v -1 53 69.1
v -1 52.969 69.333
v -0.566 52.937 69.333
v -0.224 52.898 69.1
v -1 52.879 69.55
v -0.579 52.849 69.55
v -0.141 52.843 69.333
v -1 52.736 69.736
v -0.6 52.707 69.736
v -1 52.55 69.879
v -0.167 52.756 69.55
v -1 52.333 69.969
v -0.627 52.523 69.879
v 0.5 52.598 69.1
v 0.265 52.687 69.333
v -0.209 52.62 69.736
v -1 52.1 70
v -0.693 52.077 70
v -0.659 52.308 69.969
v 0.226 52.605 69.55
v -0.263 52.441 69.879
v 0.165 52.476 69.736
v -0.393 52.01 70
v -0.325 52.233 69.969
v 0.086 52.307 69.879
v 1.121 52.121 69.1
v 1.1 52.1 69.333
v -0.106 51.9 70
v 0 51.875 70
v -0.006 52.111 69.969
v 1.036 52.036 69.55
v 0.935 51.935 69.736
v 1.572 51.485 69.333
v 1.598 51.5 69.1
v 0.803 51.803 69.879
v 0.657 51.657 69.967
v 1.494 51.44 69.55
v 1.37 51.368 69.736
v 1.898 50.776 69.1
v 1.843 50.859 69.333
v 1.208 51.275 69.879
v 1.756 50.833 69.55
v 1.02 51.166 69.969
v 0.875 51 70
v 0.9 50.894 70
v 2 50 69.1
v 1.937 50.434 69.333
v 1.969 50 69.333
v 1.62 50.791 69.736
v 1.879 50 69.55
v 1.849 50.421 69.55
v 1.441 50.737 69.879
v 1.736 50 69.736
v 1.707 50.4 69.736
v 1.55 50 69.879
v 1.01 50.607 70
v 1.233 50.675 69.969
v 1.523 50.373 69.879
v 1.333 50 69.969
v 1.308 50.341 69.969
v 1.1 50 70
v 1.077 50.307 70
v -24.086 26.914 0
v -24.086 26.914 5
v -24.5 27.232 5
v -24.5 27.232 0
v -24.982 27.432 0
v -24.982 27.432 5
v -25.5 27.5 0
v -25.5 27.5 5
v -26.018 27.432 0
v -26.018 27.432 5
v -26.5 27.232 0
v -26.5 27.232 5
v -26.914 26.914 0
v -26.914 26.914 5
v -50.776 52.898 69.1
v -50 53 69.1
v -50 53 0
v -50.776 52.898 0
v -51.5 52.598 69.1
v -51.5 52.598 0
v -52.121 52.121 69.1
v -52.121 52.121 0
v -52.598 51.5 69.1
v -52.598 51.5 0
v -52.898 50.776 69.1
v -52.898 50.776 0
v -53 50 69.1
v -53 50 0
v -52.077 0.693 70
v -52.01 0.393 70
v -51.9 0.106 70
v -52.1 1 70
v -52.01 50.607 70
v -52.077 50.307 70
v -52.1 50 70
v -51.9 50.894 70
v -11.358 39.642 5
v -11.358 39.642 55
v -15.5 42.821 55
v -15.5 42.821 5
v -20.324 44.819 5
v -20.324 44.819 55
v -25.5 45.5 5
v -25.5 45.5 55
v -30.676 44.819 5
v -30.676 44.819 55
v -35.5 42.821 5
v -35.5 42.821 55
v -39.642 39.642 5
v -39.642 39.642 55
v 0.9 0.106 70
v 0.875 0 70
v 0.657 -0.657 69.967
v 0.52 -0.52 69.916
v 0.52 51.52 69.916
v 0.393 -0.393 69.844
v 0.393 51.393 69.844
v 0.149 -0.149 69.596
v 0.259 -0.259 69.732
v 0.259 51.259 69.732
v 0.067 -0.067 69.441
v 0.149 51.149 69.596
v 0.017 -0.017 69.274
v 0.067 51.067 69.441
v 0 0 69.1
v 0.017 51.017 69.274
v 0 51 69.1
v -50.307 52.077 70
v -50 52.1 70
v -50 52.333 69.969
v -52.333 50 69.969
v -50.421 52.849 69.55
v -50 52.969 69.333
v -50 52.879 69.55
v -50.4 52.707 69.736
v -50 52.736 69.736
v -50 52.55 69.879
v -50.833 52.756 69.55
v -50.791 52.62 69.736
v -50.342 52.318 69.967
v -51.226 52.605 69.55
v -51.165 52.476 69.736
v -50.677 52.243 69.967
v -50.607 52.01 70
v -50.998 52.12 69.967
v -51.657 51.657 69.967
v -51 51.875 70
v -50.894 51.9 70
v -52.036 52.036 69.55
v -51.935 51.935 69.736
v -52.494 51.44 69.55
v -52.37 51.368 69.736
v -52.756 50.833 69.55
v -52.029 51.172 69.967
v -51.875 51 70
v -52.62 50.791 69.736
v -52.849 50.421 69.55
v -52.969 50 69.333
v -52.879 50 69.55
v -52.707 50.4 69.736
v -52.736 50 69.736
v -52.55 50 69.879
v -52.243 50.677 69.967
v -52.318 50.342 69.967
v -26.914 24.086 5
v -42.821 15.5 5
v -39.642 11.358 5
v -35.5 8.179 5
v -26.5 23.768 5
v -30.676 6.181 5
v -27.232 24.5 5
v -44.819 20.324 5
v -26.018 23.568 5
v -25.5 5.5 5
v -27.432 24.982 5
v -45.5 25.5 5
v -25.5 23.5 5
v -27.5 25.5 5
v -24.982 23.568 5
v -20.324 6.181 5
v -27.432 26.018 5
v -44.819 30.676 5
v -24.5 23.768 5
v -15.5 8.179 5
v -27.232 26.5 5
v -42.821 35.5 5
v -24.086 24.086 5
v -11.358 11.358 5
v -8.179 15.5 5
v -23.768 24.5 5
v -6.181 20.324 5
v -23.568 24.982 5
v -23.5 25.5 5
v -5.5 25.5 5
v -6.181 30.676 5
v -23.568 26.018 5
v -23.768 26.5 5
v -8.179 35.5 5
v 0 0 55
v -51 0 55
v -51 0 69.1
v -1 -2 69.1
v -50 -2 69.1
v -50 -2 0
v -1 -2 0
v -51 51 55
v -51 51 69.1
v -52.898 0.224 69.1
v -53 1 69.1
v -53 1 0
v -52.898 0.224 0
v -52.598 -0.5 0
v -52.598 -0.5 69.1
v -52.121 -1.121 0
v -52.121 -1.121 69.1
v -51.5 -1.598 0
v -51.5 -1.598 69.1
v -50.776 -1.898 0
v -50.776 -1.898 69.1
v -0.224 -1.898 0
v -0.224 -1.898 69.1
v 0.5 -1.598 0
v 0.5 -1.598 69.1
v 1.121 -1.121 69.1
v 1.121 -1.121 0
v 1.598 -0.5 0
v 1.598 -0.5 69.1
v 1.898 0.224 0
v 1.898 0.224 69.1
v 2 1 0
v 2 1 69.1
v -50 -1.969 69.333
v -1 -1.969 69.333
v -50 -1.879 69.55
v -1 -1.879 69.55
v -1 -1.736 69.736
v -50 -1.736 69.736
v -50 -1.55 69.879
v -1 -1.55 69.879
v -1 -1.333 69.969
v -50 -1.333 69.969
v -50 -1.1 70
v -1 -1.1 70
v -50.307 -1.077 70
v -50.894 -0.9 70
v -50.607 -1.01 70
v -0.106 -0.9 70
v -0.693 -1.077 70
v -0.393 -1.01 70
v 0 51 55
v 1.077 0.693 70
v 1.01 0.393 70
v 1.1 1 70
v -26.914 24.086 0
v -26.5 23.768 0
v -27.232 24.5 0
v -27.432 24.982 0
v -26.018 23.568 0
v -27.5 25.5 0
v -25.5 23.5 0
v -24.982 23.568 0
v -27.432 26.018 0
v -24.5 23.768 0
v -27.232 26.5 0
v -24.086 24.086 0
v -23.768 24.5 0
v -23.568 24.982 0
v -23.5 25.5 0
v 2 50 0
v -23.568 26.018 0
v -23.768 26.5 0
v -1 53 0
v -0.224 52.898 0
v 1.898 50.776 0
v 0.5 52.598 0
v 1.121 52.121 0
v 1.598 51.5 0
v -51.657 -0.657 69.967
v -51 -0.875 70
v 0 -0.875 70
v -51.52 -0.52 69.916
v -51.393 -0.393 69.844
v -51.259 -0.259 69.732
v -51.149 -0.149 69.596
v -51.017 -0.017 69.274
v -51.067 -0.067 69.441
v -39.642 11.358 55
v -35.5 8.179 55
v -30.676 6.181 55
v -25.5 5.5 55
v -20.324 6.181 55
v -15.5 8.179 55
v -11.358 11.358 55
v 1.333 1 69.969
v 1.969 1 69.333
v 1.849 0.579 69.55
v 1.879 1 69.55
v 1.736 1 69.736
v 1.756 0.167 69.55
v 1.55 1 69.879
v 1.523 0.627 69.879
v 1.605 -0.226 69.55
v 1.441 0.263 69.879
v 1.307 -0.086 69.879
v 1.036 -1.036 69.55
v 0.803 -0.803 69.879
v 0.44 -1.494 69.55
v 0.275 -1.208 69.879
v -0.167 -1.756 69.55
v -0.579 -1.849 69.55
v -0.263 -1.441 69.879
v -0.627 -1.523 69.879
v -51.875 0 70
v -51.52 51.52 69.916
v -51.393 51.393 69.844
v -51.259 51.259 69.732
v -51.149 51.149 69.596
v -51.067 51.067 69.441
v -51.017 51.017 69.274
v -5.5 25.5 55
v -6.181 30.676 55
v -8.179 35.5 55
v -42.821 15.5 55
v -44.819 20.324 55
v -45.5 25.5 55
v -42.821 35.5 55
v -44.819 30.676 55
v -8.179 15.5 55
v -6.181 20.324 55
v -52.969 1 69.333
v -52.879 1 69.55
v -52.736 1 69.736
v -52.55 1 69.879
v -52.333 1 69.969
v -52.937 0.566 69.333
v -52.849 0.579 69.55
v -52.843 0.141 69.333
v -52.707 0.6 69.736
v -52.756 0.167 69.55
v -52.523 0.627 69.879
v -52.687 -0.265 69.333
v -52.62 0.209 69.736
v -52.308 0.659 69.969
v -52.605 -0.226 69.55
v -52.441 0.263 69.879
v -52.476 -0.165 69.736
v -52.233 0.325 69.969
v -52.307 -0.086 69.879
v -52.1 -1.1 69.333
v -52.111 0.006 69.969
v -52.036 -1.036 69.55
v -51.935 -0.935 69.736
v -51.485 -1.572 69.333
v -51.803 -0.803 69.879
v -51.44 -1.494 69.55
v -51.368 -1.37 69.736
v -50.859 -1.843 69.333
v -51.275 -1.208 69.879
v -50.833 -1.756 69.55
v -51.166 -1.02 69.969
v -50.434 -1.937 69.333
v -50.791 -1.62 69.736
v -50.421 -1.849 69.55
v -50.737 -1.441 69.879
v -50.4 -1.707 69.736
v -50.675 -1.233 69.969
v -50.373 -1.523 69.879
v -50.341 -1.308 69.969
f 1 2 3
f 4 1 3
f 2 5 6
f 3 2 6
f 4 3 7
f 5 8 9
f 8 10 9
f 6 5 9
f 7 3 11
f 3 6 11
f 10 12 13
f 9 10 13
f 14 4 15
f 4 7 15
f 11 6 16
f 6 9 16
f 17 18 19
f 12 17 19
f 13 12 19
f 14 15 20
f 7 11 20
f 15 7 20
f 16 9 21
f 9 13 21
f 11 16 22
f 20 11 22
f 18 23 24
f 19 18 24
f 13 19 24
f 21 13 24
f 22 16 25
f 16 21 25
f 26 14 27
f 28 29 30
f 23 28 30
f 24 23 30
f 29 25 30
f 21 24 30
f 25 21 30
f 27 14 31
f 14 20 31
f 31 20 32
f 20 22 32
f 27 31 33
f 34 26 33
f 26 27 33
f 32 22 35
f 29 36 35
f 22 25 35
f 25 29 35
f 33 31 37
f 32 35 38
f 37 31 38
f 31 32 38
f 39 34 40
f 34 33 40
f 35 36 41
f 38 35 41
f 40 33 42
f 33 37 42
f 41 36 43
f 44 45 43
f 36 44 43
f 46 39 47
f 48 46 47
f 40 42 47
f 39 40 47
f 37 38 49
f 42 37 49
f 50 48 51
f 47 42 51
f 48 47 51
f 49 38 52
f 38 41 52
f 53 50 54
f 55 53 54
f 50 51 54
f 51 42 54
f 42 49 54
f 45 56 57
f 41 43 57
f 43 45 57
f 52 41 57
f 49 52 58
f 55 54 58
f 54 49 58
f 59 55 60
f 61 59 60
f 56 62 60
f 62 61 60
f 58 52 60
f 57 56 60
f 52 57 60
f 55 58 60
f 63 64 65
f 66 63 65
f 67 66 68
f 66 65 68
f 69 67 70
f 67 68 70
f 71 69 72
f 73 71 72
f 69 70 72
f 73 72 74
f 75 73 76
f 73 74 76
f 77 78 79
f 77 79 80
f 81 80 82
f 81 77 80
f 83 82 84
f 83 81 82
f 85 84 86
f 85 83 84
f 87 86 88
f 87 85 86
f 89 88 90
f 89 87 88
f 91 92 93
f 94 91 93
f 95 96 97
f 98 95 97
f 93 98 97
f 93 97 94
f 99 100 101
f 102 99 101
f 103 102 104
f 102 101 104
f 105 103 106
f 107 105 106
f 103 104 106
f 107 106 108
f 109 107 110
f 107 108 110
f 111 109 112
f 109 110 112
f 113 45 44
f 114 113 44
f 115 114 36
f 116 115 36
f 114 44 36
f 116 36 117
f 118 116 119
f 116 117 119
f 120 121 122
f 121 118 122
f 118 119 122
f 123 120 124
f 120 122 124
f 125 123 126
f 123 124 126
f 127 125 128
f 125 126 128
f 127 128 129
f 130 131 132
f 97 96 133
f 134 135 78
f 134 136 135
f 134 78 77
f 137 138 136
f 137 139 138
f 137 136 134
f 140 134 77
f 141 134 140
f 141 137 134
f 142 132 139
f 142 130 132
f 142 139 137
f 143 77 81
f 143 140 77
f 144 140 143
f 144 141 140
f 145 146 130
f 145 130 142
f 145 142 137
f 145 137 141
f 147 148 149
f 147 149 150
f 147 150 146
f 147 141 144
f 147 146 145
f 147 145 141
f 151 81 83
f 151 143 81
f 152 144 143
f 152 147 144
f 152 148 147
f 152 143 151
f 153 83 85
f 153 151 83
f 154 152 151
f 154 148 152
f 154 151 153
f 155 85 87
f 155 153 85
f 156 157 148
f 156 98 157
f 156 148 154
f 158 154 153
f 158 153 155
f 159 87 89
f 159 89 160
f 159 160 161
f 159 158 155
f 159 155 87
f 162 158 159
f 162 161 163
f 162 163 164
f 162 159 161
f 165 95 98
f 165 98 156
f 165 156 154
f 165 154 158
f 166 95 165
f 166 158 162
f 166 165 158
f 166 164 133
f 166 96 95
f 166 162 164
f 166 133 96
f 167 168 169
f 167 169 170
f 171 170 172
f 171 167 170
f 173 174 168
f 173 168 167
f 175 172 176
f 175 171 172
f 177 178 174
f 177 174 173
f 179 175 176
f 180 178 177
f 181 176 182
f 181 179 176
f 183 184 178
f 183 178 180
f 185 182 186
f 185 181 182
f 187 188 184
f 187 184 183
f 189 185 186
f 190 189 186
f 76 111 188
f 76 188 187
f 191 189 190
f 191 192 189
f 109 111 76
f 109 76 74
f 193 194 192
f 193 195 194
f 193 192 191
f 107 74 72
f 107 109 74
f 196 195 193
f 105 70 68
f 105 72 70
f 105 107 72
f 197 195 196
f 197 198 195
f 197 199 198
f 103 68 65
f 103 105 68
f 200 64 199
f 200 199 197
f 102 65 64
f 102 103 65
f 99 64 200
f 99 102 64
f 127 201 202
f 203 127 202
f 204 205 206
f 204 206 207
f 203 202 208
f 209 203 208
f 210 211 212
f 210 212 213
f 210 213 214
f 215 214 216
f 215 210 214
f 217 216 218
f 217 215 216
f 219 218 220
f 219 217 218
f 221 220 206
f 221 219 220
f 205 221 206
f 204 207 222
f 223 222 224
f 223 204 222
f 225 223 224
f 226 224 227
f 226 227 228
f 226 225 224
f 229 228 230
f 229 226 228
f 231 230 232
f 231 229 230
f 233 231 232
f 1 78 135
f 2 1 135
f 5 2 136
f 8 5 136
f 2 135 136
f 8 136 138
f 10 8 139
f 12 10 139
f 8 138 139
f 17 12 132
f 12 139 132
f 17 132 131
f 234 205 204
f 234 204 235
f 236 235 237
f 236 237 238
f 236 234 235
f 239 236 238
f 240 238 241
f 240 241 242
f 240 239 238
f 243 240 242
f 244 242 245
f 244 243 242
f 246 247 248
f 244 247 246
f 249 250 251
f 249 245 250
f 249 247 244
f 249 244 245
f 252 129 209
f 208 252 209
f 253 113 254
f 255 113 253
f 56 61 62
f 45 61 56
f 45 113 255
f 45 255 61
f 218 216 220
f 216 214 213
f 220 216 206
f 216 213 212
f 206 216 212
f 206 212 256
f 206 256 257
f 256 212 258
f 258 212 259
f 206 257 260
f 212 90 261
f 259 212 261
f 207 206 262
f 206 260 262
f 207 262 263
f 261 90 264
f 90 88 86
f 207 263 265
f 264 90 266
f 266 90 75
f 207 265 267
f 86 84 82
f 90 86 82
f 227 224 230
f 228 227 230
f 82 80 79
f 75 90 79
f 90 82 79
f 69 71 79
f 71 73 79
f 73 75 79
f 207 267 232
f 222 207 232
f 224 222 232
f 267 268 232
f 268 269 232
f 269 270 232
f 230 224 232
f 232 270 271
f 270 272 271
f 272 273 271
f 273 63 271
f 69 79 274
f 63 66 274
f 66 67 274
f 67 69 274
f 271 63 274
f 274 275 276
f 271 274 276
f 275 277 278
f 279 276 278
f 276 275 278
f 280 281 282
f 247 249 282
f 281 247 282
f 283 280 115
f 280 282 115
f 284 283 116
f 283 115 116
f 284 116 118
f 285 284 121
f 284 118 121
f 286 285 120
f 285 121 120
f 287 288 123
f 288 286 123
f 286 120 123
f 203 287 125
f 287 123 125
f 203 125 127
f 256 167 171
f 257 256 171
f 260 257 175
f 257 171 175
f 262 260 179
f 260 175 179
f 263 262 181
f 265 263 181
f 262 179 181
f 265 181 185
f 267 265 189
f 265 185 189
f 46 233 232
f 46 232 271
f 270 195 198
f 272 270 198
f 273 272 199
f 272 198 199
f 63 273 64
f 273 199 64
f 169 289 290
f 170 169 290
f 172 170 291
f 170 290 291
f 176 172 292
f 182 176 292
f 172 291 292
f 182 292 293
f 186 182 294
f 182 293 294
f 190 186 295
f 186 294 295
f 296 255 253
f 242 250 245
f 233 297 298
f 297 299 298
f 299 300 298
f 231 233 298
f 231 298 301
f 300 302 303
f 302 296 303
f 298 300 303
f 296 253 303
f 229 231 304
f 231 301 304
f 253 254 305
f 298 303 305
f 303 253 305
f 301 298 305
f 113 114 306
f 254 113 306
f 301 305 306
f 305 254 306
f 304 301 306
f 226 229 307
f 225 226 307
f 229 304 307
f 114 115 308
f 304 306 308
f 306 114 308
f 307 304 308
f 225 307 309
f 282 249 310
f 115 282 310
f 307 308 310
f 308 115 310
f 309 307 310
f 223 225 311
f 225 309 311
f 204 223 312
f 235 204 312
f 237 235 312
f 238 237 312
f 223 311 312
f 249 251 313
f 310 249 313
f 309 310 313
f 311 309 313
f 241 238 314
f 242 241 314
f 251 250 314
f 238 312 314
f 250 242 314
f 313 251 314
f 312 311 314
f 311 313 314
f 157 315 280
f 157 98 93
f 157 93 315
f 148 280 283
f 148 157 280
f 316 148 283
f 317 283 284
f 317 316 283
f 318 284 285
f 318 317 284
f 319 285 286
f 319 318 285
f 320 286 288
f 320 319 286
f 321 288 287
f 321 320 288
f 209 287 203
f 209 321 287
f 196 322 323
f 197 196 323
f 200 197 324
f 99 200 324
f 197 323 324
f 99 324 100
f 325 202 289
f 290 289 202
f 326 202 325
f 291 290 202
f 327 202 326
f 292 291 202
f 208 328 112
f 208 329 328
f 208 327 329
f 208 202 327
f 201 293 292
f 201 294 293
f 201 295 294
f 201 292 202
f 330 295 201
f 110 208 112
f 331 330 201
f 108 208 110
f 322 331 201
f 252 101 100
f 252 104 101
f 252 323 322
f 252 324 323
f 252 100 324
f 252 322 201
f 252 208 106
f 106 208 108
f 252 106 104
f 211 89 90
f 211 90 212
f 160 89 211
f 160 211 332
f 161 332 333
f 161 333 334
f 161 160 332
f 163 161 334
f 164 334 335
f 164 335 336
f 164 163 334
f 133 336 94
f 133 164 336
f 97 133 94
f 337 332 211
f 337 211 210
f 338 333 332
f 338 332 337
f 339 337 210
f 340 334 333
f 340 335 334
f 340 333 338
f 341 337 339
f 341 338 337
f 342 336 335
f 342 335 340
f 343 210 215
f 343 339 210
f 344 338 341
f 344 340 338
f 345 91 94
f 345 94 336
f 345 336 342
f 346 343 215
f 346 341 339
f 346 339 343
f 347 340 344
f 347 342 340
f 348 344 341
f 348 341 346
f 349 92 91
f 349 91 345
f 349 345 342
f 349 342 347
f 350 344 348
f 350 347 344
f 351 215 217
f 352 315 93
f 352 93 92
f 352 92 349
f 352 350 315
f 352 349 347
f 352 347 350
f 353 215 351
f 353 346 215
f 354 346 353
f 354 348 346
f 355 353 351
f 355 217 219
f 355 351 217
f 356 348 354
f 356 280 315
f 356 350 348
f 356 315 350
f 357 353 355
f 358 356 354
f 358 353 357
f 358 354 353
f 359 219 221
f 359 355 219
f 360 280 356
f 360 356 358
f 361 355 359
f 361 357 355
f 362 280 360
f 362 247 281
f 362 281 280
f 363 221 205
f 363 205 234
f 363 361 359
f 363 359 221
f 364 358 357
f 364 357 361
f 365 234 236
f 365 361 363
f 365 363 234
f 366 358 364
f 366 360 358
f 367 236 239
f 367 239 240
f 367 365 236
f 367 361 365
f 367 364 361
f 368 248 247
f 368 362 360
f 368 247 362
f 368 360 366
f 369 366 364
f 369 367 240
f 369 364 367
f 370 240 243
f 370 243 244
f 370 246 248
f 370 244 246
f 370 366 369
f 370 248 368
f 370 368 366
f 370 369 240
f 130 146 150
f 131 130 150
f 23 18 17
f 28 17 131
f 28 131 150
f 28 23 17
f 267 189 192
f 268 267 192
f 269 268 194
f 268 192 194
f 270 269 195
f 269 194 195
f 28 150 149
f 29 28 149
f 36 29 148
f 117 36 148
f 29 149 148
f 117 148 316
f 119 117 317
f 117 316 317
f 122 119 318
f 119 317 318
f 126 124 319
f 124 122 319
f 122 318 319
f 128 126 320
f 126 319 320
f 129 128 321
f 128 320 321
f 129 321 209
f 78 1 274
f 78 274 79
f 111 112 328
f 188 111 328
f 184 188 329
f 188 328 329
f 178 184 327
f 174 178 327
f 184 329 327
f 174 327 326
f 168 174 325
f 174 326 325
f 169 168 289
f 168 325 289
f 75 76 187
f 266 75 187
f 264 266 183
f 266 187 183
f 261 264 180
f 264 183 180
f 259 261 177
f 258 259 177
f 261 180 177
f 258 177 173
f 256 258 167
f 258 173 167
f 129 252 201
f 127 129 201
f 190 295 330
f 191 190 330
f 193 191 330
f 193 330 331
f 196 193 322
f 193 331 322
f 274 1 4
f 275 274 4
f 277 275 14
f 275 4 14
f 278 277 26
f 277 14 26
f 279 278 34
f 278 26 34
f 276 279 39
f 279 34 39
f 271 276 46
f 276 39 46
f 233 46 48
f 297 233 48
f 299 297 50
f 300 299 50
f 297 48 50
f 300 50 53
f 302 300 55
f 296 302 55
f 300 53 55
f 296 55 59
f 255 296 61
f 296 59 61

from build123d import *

# Parameters (mm, degrees)
F0_W         = 51
F0_H         = 51
F1_DEPTH     = 55
F2_DEPTH     = 70
F4_DEPTH     = 50
F5_DEPTH     = 100
F6_R         = 3
F7_T1_DEPTH  = 51
F7_T3_DEPTH  = 51
F7_T5_DEPTH  = 49
F7_T7_DEPTH  = 49
F7_T10_ANGLE = 90
F7_T12_ANGLE = 90
F7_T14_ANGLE = 90
F7_T16_ANGLE = 90
F7_T21_DEPTH = 53.25
F7_T25_DEPTH = 53.25
F7_T32_DEPTH = 53.25
F7_T36_DEPTH = 53.25
F7_T43_DEPTH = 53.25
F7_T47_DEPTH = 53.25
F7_T54_DEPTH = 53.25
F7_T58_DEPTH = 53.25


# Not quite as in the source:
# - a fillet or chamfer that OpenCascade refuses, or shapes differently, is made with other operations: its cross-section is extruded or revolved along the edge and cut away or added


with BuildPart() as f1:
    # F0 (on Top) → F1 (new body)
    with BuildSketch(Plane.XY):
        with Locations((-25.5, 25.5)):
            Rectangle(F0_W, F0_H)
    extrude(amount=F1_DEPTH)

    # F0 (on Top) → F2 (join)
    with BuildSketch(Plane.XY):
        Polygon((-51, -2), (-51, 0), (-51, 51), (0, 51), (2, 51), (2, 53), (-53, 53), (-53, -2), align=None)
        Polygon((0, 51), (0, 0), (-51, 0), (-51, -2), (0, -2), (2, -2), (2, 51), align=None)
    extrude(amount=F2_DEPTH)

    # F3 (on face) → F4 (cut)
    with BuildSketch(Plane.XY.offset(55)):
        with BuildLine():
            Line((-26.9142135624, 26.9142135624), (-39.6421356237, 39.6421356237))
            ThreePointArc((-39.6421356237, 39.6421356237), (-45.5, 25.5), (-39.6421356237, 11.3578643763))
            Line((-39.6421356237, 11.3578643763), (-26.9142135624, 24.0857864376))
            ThreePointArc((-26.9142135624, 24.0857864376), (-27.5, 25.5), (-26.9142135624, 26.9142135624))
        make_face()
        with BuildLine():
            Line((-24.0857864376, 26.9142135624), (-25.5, 25.5))
            Line((-25.5, 25.5), (-24.0857864376, 24.0857864376))
            ThreePointArc((-24.0857864376, 24.0857864376), (-23.652240935, 24.7346331353), (-23.5, 25.5))
            ThreePointArc((-23.5, 25.5), (-23.652240935, 26.2653668647), (-24.0857864376, 26.9142135624))
        make_face()
        with BuildLine():
            Line((-24.0857864376, 24.0857864376), (-25.5, 25.5))
            Line((-25.5, 25.5), (-26.9142135624, 24.0857864376))
            ThreePointArc((-26.9142135624, 24.0857864376), (-25.5, 23.5), (-24.0857864376, 24.0857864376))
        make_face()
        with BuildLine():
            ThreePointArc((-11.3578643763, 39.6421356237), (-25.5, 45.5), (-39.6421356237, 39.6421356237))
            Line((-39.6421356237, 39.6421356237), (-26.9142135624, 26.9142135624))
            ThreePointArc((-26.9142135624, 26.9142135624), (-25.5, 27.5), (-24.0857864376, 26.9142135624))
            Line((-24.0857864376, 26.9142135624), (-11.3578643763, 39.6421356237))
        make_face()
        with BuildLine():
            Line((-25.5, 25.5), (-26.9142135624, 26.9142135624))
            ThreePointArc((-26.9142135624, 26.9142135624), (-27.5, 25.5), (-26.9142135624, 24.0857864376))
            Line((-26.9142135624, 24.0857864376), (-25.5, 25.5))
        make_face()
        with BuildLine():
            ThreePointArc((-5.5, 25.5), (-7.0224093498, 33.1536686473), (-11.3578643763, 39.6421356237))
            Line((-11.3578643763, 39.6421356237), (-24.0857864376, 26.9142135624))
            ThreePointArc((-24.0857864376, 26.9142135624), (-23.652240935, 26.2653668647), (-23.5, 25.5))
            ThreePointArc((-23.5, 25.5), (-23.652240935, 24.7346331353), (-24.0857864376, 24.0857864376))
            Line((-24.0857864376, 24.0857864376), (-11.3578643763, 11.3578643763))
            ThreePointArc((-11.3578643763, 11.3578643763), (-7.0224093498, 17.8463313527), (-5.5, 25.5))
        make_face()
        with BuildLine():
            Line((-26.9142135624, 24.0857864376), (-39.6421356237, 11.3578643763))
            ThreePointArc((-39.6421356237, 11.3578643763), (-25.5, 5.5), (-11.3578643763, 11.3578643763))
            Line((-11.3578643763, 11.3578643763), (-24.0857864376, 24.0857864376))
            ThreePointArc((-24.0857864376, 24.0857864376), (-25.5, 23.5), (-26.9142135624, 24.0857864376))
        make_face()
        with BuildLine():
            ThreePointArc((-24.0857864376, 26.9142135624), (-25.5, 27.5), (-26.9142135624, 26.9142135624))
            Line((-26.9142135624, 26.9142135624), (-25.5, 25.5))
            Line((-25.5, 25.5), (-24.0857864376, 26.9142135624))
        make_face()
    extrude(amount=-F4_DEPTH, mode=Mode.SUBTRACT)

    # F3 (on face) → F5 (cut)
    with BuildSketch(Plane.XY.offset(55)):
        with BuildLine():
            ThreePointArc((-24.0857864376, 26.9142135624), (-25.5, 27.5), (-26.9142135624, 26.9142135624))
            Line((-26.9142135624, 26.9142135624), (-25.5, 25.5))
            Line((-25.5, 25.5), (-24.0857864376, 26.9142135624))
        make_face()
        with BuildLine():
            Line((-24.0857864376, 26.9142135624), (-25.5, 25.5))
            Line((-25.5, 25.5), (-24.0857864376, 24.0857864376))
            ThreePointArc((-24.0857864376, 24.0857864376), (-23.652240935, 24.7346331353), (-23.5, 25.5))
            ThreePointArc((-23.5, 25.5), (-23.652240935, 26.2653668647), (-24.0857864376, 26.9142135624))
        make_face()
        with BuildLine():
            Line((-24.0857864376, 24.0857864376), (-25.5, 25.5))
            Line((-25.5, 25.5), (-26.9142135624, 24.0857864376))
            ThreePointArc((-26.9142135624, 24.0857864376), (-25.5, 23.5), (-24.0857864376, 24.0857864376))
        make_face()
        with BuildLine():
            Line((-25.5, 25.5), (-26.9142135624, 26.9142135624))
            ThreePointArc((-26.9142135624, 26.9142135624), (-27.5, 25.5), (-26.9142135624, 24.0857864376))
            Line((-26.9142135624, 24.0857864376), (-25.5, 25.5))
        make_face()
    extrude(amount=-F5_DEPTH, mode=Mode.SUBTRACT)

    # F6
    f6_edges = [f1.edges().sort_by_distance(p)[0] for p in [
        (2, 53, 35),
        (-53, 53, 35),
        (-53, -2, 35),
        (2, -2, 35),
    ]]
    fillet(f6_edges, radius=F6_R)

    # F7: fillet of radius 0.9 on 5 edges, made by hand

    # F7_s2 → F7_t1 (cut)
    with BuildSketch(Plane.XZ.offset(-51)):
        with BuildLine():
            ThreePointArc((0.9, 70), (0.2636038969, 69.7363961031), (0, 69.1))
            Line((0, 69.1), (0, 70))
            Line((0, 70), (0.9, 70))
        make_face()
        with BuildLine():
            ThreePointArc((-51.9, 70), (-51.2636038969, 69.7363961031), (-51, 69.1))
            Line((-51, 69.1), (-51, 70))
            Line((-51, 70), (-51.9, 70))
        make_face()
    extrude(amount=F7_T1_DEPTH, mode=Mode.SUBTRACT)

    # F7_s4 → F7_t3 (cut)
    with BuildSketch(Plane.YZ.offset(-51)):
        with BuildLine():
            ThreePointArc((51.9, 70), (51.2636038969, 69.7363961031), (51, 69.1))
            Line((51, 69.1), (51, 70))
            Line((51, 70), (51.9, 70))
        make_face()
        with BuildLine():
            ThreePointArc((-0.9, 70), (-0.2636038969, 69.7363961031), (0, 69.1))
            Line((0, 69.1), (0, 70))
            Line((0, 70), (-0.9, 70))
        make_face()
    extrude(amount=F7_T3_DEPTH, mode=Mode.SUBTRACT)

    # F7_s6 → F7_t5 (cut)
    with BuildSketch(Plane.YZ.offset(-50)):
        with BuildLine():
            ThreePointArc((-2, 69.1), (-1.7363961031, 69.7363961031), (-1.1, 70))
            Line((-1.1, 70), (-2, 70))
            Line((-2, 70), (-2, 69.1))
        make_face()
        with BuildLine():
            ThreePointArc((53, 69.1), (52.7363961031, 69.7363961031), (52.1, 70))
            Line((52.1, 70), (53, 70))
            Line((53, 70), (53, 69.1))
        make_face()
    extrude(amount=F7_T5_DEPTH, mode=Mode.SUBTRACT)

    # F7_s8 → F7_t7 (cut)
    with BuildSketch(Plane.XZ.offset(-50)):
        with BuildLine():
            ThreePointArc((2, 69.1), (1.7363961031, 69.7363961031), (1.1, 70))
            Line((1.1, 70), (2, 70))
            Line((2, 70), (2, 69.1))
        make_face()
        with BuildLine():
            ThreePointArc((-53, 69.1), (-52.7363961031, 69.7363961031), (-52.1, 70))
            Line((-52.1, 70), (-53, 70))
            Line((-53, 70), (-53, 69.1))
        make_face()
    extrude(amount=F7_T7_DEPTH, mode=Mode.SUBTRACT)

    # F7_s9 → F7_t10 (revolve, cut)
    with BuildSketch(Plane.XZ.offset(-1)):
        with BuildLine():
            ThreePointArc((-53, 69.1), (-52.7363961031, 69.7363961031), (-52.1, 70))
            Line((-52.1, 70), (-53, 70))
            Line((-53, 70), (-53, 69.1))
        make_face()
    revolve(axis=Axis((-50, 1, 70), (0, 0, 1)), revolution_arc=F7_T10_ANGLE, mode=Mode.SUBTRACT)

    # F7_s11 → F7_t12 (revolve, cut)
    with BuildSketch(Plane.XZ.offset(-1)):
        with BuildLine():
            ThreePointArc((2, 69.1), (1.7363961031, 69.7363961031), (1.1, 70))
            Line((1.1, 70), (2, 70))
            Line((2, 70), (2, 69.1))
        make_face()
    revolve(axis=Axis((-1, 1, 70), (0, 0, -1)), revolution_arc=F7_T12_ANGLE, mode=Mode.SUBTRACT)

    # F7_s13 → F7_t14 (revolve, cut)
    with BuildSketch(Plane.YZ.offset(-1)):
        with BuildLine():
            ThreePointArc((53, 69.1), (52.7363961031, 69.7363961031), (52.1, 70))
            Line((52.1, 70), (53, 70))
            Line((53, 70), (53, 69.1))
        make_face()
    revolve(axis=Axis((-1, 50, 70), (0, 0, -1)), revolution_arc=F7_T14_ANGLE, mode=Mode.SUBTRACT)

    # F7_s15 → F7_t16 (revolve, cut)
    with BuildSketch(Plane.YZ.offset(-50)):
        with BuildLine():
            ThreePointArc((53, 69.1), (52.7363961031, 69.7363961031), (52.1, 70))
            Line((52.1, 70), (53, 70))
            Line((53, 70), (53, 69.1))
        make_face()
    revolve(axis=Axis((-50, 50, 70), (0, 0, 1)), revolution_arc=F7_T16_ANGLE, mode=Mode.SUBTRACT)


with BuildPart() as f7_tool19:
    # F7_s20 → F7_t21 (new body)
    with BuildSketch(Plane.YZ.offset(-51)):
        with BuildLine():
            ThreePointArc((51.9, 70), (51.2636038969, 69.7363961031), (51, 69.1))
            Line((51, 69.1), (51, 70))
            Line((51, 70), (51.9, 70))
        make_face()
    extrude(amount=F7_T21_DEPTH)

    split(bisect_by=Plane.YZ, keep=Keep.TOP)


with BuildPart() as f7_tool23:
    # F7_s24 → F7_t25 (new body)
    with BuildSketch(Plane.XZ.offset(-53.25)):
        with BuildLine():
            ThreePointArc((0.9, 70), (0.2636038969, 69.7363961031), (0, 69.1))
            Line((0, 69.1), (0, 70))
            Line((0, 70), (0.9, 70))
        make_face()
    extrude(amount=F7_T25_DEPTH)

    split(bisect_by=Plane.XZ.offset(-51), keep=Keep.BOTTOM)


with BuildPart() as f7_tool19_1:
    add(f7_tool19.part)

    # F7_t27: intersect F7_tool23
    add(f7_tool23.part, mode=Mode.INTERSECT)


with BuildPart() as f1_1:
    add(f1.part)

    # F7_t17: cut F7_tool19
    add(f7_tool19_1.part, mode=Mode.SUBTRACT)


with BuildPart() as f7_tool30:
    # F7_s31 → F7_t32 (new body)
    with BuildSketch(Plane.XZ.offset(-51)):
        with BuildLine():
            ThreePointArc((0.9, 70), (0.2636038969, 69.7363961031), (0, 69.1))
            Line((0, 69.1), (0, 70))
            Line((0, 70), (0.9, 70))
        make_face()
    extrude(amount=F7_T32_DEPTH)

    split(bisect_by=Plane.XZ, keep=Keep.TOP)


with BuildPart() as f7_tool34:
    # F7_s35 → F7_t36 (new body)
    with BuildSketch(Plane.YZ.offset(2.25)):
        with BuildLine():
            ThreePointArc((-0.9, 70), (-0.2636038969, 69.7363961031), (0, 69.1))
            Line((0, 69.1), (0, 70))
            Line((0, 70), (-0.9, 70))
        make_face()
    extrude(amount=-F7_T36_DEPTH)

    split(bisect_by=Plane.YZ, keep=Keep.TOP)


with BuildPart() as f7_tool30_1:
    add(f7_tool30.part)

    # F7_t38: intersect F7_tool34
    add(f7_tool34.part, mode=Mode.INTERSECT)


with BuildPart() as f1_2:
    add(f1_1.part)

    # F7_t28: cut F7_tool30
    add(f7_tool30_1.part, mode=Mode.SUBTRACT)


with BuildPart() as f7_tool41:
    # F7_s42 → F7_t43 (new body)
    with BuildSketch(Plane.XZ):
        with BuildLine():
            ThreePointArc((-51.9, 70), (-51.2636038969, 69.7363961031), (-51, 69.1))
            Line((-51, 69.1), (-51, 70))
            Line((-51, 70), (-51.9, 70))
        make_face()
    extrude(amount=-F7_T43_DEPTH)

    split(bisect_by=Plane.XZ.offset(-51), keep=Keep.BOTTOM)


with BuildPart() as f7_tool45:
    # F7_s46 → F7_t47 (new body)
    with BuildSketch(Plane.YZ.offset(-53.25)):
        with BuildLine():
            ThreePointArc((51.9, 70), (51.2636038969, 69.7363961031), (51, 69.1))
            Line((51, 69.1), (51, 70))
            Line((51, 70), (51.9, 70))
        make_face()
    extrude(amount=F7_T47_DEPTH)

    split(bisect_by=Plane.YZ.offset(-51), keep=Keep.BOTTOM)


with BuildPart() as f7_tool41_1:
    add(f7_tool41.part)

    # F7_t49: intersect F7_tool45
    add(f7_tool45.part, mode=Mode.INTERSECT)


with BuildPart() as f1_3:
    add(f1_2.part)

    # F7_t39: cut F7_tool41
    add(f7_tool41_1.part, mode=Mode.SUBTRACT)


with BuildPart() as f7_tool52:
    # F7_s53 → F7_t54 (new body)
    with BuildSketch(Plane.XZ.offset(2.25)):
        with BuildLine():
            ThreePointArc((-51.9, 70), (-51.2636038969, 69.7363961031), (-51, 69.1))
            Line((-51, 69.1), (-51, 70))
            Line((-51, 70), (-51.9, 70))
        make_face()
    extrude(amount=-F7_T54_DEPTH)

    split(bisect_by=Plane.XZ, keep=Keep.TOP)


with BuildPart() as f7_tool56:
    # F7_s57 → F7_t58 (new body)
    with BuildSketch(Plane.YZ):
        with BuildLine():
            ThreePointArc((-0.9, 70), (-0.2636038969, 69.7363961031), (0, 69.1))
            Line((0, 69.1), (0, 70))
            Line((0, 70), (-0.9, 70))
        make_face()
    extrude(amount=-F7_T58_DEPTH)

    split(bisect_by=Plane.YZ.offset(-51), keep=Keep.BOTTOM)


with BuildPart() as f7_tool52_1:
    add(f7_tool52.part)

    # F7_t60: intersect F7_tool56
    add(f7_tool56.part, mode=Mode.INTERSECT)


with BuildPart() as f1_4:
    add(f1_3.part)

    # F7_t50: cut F7_tool52
    add(f7_tool52_1.part, mode=Mode.SUBTRACT)


solid = f1_4.part
